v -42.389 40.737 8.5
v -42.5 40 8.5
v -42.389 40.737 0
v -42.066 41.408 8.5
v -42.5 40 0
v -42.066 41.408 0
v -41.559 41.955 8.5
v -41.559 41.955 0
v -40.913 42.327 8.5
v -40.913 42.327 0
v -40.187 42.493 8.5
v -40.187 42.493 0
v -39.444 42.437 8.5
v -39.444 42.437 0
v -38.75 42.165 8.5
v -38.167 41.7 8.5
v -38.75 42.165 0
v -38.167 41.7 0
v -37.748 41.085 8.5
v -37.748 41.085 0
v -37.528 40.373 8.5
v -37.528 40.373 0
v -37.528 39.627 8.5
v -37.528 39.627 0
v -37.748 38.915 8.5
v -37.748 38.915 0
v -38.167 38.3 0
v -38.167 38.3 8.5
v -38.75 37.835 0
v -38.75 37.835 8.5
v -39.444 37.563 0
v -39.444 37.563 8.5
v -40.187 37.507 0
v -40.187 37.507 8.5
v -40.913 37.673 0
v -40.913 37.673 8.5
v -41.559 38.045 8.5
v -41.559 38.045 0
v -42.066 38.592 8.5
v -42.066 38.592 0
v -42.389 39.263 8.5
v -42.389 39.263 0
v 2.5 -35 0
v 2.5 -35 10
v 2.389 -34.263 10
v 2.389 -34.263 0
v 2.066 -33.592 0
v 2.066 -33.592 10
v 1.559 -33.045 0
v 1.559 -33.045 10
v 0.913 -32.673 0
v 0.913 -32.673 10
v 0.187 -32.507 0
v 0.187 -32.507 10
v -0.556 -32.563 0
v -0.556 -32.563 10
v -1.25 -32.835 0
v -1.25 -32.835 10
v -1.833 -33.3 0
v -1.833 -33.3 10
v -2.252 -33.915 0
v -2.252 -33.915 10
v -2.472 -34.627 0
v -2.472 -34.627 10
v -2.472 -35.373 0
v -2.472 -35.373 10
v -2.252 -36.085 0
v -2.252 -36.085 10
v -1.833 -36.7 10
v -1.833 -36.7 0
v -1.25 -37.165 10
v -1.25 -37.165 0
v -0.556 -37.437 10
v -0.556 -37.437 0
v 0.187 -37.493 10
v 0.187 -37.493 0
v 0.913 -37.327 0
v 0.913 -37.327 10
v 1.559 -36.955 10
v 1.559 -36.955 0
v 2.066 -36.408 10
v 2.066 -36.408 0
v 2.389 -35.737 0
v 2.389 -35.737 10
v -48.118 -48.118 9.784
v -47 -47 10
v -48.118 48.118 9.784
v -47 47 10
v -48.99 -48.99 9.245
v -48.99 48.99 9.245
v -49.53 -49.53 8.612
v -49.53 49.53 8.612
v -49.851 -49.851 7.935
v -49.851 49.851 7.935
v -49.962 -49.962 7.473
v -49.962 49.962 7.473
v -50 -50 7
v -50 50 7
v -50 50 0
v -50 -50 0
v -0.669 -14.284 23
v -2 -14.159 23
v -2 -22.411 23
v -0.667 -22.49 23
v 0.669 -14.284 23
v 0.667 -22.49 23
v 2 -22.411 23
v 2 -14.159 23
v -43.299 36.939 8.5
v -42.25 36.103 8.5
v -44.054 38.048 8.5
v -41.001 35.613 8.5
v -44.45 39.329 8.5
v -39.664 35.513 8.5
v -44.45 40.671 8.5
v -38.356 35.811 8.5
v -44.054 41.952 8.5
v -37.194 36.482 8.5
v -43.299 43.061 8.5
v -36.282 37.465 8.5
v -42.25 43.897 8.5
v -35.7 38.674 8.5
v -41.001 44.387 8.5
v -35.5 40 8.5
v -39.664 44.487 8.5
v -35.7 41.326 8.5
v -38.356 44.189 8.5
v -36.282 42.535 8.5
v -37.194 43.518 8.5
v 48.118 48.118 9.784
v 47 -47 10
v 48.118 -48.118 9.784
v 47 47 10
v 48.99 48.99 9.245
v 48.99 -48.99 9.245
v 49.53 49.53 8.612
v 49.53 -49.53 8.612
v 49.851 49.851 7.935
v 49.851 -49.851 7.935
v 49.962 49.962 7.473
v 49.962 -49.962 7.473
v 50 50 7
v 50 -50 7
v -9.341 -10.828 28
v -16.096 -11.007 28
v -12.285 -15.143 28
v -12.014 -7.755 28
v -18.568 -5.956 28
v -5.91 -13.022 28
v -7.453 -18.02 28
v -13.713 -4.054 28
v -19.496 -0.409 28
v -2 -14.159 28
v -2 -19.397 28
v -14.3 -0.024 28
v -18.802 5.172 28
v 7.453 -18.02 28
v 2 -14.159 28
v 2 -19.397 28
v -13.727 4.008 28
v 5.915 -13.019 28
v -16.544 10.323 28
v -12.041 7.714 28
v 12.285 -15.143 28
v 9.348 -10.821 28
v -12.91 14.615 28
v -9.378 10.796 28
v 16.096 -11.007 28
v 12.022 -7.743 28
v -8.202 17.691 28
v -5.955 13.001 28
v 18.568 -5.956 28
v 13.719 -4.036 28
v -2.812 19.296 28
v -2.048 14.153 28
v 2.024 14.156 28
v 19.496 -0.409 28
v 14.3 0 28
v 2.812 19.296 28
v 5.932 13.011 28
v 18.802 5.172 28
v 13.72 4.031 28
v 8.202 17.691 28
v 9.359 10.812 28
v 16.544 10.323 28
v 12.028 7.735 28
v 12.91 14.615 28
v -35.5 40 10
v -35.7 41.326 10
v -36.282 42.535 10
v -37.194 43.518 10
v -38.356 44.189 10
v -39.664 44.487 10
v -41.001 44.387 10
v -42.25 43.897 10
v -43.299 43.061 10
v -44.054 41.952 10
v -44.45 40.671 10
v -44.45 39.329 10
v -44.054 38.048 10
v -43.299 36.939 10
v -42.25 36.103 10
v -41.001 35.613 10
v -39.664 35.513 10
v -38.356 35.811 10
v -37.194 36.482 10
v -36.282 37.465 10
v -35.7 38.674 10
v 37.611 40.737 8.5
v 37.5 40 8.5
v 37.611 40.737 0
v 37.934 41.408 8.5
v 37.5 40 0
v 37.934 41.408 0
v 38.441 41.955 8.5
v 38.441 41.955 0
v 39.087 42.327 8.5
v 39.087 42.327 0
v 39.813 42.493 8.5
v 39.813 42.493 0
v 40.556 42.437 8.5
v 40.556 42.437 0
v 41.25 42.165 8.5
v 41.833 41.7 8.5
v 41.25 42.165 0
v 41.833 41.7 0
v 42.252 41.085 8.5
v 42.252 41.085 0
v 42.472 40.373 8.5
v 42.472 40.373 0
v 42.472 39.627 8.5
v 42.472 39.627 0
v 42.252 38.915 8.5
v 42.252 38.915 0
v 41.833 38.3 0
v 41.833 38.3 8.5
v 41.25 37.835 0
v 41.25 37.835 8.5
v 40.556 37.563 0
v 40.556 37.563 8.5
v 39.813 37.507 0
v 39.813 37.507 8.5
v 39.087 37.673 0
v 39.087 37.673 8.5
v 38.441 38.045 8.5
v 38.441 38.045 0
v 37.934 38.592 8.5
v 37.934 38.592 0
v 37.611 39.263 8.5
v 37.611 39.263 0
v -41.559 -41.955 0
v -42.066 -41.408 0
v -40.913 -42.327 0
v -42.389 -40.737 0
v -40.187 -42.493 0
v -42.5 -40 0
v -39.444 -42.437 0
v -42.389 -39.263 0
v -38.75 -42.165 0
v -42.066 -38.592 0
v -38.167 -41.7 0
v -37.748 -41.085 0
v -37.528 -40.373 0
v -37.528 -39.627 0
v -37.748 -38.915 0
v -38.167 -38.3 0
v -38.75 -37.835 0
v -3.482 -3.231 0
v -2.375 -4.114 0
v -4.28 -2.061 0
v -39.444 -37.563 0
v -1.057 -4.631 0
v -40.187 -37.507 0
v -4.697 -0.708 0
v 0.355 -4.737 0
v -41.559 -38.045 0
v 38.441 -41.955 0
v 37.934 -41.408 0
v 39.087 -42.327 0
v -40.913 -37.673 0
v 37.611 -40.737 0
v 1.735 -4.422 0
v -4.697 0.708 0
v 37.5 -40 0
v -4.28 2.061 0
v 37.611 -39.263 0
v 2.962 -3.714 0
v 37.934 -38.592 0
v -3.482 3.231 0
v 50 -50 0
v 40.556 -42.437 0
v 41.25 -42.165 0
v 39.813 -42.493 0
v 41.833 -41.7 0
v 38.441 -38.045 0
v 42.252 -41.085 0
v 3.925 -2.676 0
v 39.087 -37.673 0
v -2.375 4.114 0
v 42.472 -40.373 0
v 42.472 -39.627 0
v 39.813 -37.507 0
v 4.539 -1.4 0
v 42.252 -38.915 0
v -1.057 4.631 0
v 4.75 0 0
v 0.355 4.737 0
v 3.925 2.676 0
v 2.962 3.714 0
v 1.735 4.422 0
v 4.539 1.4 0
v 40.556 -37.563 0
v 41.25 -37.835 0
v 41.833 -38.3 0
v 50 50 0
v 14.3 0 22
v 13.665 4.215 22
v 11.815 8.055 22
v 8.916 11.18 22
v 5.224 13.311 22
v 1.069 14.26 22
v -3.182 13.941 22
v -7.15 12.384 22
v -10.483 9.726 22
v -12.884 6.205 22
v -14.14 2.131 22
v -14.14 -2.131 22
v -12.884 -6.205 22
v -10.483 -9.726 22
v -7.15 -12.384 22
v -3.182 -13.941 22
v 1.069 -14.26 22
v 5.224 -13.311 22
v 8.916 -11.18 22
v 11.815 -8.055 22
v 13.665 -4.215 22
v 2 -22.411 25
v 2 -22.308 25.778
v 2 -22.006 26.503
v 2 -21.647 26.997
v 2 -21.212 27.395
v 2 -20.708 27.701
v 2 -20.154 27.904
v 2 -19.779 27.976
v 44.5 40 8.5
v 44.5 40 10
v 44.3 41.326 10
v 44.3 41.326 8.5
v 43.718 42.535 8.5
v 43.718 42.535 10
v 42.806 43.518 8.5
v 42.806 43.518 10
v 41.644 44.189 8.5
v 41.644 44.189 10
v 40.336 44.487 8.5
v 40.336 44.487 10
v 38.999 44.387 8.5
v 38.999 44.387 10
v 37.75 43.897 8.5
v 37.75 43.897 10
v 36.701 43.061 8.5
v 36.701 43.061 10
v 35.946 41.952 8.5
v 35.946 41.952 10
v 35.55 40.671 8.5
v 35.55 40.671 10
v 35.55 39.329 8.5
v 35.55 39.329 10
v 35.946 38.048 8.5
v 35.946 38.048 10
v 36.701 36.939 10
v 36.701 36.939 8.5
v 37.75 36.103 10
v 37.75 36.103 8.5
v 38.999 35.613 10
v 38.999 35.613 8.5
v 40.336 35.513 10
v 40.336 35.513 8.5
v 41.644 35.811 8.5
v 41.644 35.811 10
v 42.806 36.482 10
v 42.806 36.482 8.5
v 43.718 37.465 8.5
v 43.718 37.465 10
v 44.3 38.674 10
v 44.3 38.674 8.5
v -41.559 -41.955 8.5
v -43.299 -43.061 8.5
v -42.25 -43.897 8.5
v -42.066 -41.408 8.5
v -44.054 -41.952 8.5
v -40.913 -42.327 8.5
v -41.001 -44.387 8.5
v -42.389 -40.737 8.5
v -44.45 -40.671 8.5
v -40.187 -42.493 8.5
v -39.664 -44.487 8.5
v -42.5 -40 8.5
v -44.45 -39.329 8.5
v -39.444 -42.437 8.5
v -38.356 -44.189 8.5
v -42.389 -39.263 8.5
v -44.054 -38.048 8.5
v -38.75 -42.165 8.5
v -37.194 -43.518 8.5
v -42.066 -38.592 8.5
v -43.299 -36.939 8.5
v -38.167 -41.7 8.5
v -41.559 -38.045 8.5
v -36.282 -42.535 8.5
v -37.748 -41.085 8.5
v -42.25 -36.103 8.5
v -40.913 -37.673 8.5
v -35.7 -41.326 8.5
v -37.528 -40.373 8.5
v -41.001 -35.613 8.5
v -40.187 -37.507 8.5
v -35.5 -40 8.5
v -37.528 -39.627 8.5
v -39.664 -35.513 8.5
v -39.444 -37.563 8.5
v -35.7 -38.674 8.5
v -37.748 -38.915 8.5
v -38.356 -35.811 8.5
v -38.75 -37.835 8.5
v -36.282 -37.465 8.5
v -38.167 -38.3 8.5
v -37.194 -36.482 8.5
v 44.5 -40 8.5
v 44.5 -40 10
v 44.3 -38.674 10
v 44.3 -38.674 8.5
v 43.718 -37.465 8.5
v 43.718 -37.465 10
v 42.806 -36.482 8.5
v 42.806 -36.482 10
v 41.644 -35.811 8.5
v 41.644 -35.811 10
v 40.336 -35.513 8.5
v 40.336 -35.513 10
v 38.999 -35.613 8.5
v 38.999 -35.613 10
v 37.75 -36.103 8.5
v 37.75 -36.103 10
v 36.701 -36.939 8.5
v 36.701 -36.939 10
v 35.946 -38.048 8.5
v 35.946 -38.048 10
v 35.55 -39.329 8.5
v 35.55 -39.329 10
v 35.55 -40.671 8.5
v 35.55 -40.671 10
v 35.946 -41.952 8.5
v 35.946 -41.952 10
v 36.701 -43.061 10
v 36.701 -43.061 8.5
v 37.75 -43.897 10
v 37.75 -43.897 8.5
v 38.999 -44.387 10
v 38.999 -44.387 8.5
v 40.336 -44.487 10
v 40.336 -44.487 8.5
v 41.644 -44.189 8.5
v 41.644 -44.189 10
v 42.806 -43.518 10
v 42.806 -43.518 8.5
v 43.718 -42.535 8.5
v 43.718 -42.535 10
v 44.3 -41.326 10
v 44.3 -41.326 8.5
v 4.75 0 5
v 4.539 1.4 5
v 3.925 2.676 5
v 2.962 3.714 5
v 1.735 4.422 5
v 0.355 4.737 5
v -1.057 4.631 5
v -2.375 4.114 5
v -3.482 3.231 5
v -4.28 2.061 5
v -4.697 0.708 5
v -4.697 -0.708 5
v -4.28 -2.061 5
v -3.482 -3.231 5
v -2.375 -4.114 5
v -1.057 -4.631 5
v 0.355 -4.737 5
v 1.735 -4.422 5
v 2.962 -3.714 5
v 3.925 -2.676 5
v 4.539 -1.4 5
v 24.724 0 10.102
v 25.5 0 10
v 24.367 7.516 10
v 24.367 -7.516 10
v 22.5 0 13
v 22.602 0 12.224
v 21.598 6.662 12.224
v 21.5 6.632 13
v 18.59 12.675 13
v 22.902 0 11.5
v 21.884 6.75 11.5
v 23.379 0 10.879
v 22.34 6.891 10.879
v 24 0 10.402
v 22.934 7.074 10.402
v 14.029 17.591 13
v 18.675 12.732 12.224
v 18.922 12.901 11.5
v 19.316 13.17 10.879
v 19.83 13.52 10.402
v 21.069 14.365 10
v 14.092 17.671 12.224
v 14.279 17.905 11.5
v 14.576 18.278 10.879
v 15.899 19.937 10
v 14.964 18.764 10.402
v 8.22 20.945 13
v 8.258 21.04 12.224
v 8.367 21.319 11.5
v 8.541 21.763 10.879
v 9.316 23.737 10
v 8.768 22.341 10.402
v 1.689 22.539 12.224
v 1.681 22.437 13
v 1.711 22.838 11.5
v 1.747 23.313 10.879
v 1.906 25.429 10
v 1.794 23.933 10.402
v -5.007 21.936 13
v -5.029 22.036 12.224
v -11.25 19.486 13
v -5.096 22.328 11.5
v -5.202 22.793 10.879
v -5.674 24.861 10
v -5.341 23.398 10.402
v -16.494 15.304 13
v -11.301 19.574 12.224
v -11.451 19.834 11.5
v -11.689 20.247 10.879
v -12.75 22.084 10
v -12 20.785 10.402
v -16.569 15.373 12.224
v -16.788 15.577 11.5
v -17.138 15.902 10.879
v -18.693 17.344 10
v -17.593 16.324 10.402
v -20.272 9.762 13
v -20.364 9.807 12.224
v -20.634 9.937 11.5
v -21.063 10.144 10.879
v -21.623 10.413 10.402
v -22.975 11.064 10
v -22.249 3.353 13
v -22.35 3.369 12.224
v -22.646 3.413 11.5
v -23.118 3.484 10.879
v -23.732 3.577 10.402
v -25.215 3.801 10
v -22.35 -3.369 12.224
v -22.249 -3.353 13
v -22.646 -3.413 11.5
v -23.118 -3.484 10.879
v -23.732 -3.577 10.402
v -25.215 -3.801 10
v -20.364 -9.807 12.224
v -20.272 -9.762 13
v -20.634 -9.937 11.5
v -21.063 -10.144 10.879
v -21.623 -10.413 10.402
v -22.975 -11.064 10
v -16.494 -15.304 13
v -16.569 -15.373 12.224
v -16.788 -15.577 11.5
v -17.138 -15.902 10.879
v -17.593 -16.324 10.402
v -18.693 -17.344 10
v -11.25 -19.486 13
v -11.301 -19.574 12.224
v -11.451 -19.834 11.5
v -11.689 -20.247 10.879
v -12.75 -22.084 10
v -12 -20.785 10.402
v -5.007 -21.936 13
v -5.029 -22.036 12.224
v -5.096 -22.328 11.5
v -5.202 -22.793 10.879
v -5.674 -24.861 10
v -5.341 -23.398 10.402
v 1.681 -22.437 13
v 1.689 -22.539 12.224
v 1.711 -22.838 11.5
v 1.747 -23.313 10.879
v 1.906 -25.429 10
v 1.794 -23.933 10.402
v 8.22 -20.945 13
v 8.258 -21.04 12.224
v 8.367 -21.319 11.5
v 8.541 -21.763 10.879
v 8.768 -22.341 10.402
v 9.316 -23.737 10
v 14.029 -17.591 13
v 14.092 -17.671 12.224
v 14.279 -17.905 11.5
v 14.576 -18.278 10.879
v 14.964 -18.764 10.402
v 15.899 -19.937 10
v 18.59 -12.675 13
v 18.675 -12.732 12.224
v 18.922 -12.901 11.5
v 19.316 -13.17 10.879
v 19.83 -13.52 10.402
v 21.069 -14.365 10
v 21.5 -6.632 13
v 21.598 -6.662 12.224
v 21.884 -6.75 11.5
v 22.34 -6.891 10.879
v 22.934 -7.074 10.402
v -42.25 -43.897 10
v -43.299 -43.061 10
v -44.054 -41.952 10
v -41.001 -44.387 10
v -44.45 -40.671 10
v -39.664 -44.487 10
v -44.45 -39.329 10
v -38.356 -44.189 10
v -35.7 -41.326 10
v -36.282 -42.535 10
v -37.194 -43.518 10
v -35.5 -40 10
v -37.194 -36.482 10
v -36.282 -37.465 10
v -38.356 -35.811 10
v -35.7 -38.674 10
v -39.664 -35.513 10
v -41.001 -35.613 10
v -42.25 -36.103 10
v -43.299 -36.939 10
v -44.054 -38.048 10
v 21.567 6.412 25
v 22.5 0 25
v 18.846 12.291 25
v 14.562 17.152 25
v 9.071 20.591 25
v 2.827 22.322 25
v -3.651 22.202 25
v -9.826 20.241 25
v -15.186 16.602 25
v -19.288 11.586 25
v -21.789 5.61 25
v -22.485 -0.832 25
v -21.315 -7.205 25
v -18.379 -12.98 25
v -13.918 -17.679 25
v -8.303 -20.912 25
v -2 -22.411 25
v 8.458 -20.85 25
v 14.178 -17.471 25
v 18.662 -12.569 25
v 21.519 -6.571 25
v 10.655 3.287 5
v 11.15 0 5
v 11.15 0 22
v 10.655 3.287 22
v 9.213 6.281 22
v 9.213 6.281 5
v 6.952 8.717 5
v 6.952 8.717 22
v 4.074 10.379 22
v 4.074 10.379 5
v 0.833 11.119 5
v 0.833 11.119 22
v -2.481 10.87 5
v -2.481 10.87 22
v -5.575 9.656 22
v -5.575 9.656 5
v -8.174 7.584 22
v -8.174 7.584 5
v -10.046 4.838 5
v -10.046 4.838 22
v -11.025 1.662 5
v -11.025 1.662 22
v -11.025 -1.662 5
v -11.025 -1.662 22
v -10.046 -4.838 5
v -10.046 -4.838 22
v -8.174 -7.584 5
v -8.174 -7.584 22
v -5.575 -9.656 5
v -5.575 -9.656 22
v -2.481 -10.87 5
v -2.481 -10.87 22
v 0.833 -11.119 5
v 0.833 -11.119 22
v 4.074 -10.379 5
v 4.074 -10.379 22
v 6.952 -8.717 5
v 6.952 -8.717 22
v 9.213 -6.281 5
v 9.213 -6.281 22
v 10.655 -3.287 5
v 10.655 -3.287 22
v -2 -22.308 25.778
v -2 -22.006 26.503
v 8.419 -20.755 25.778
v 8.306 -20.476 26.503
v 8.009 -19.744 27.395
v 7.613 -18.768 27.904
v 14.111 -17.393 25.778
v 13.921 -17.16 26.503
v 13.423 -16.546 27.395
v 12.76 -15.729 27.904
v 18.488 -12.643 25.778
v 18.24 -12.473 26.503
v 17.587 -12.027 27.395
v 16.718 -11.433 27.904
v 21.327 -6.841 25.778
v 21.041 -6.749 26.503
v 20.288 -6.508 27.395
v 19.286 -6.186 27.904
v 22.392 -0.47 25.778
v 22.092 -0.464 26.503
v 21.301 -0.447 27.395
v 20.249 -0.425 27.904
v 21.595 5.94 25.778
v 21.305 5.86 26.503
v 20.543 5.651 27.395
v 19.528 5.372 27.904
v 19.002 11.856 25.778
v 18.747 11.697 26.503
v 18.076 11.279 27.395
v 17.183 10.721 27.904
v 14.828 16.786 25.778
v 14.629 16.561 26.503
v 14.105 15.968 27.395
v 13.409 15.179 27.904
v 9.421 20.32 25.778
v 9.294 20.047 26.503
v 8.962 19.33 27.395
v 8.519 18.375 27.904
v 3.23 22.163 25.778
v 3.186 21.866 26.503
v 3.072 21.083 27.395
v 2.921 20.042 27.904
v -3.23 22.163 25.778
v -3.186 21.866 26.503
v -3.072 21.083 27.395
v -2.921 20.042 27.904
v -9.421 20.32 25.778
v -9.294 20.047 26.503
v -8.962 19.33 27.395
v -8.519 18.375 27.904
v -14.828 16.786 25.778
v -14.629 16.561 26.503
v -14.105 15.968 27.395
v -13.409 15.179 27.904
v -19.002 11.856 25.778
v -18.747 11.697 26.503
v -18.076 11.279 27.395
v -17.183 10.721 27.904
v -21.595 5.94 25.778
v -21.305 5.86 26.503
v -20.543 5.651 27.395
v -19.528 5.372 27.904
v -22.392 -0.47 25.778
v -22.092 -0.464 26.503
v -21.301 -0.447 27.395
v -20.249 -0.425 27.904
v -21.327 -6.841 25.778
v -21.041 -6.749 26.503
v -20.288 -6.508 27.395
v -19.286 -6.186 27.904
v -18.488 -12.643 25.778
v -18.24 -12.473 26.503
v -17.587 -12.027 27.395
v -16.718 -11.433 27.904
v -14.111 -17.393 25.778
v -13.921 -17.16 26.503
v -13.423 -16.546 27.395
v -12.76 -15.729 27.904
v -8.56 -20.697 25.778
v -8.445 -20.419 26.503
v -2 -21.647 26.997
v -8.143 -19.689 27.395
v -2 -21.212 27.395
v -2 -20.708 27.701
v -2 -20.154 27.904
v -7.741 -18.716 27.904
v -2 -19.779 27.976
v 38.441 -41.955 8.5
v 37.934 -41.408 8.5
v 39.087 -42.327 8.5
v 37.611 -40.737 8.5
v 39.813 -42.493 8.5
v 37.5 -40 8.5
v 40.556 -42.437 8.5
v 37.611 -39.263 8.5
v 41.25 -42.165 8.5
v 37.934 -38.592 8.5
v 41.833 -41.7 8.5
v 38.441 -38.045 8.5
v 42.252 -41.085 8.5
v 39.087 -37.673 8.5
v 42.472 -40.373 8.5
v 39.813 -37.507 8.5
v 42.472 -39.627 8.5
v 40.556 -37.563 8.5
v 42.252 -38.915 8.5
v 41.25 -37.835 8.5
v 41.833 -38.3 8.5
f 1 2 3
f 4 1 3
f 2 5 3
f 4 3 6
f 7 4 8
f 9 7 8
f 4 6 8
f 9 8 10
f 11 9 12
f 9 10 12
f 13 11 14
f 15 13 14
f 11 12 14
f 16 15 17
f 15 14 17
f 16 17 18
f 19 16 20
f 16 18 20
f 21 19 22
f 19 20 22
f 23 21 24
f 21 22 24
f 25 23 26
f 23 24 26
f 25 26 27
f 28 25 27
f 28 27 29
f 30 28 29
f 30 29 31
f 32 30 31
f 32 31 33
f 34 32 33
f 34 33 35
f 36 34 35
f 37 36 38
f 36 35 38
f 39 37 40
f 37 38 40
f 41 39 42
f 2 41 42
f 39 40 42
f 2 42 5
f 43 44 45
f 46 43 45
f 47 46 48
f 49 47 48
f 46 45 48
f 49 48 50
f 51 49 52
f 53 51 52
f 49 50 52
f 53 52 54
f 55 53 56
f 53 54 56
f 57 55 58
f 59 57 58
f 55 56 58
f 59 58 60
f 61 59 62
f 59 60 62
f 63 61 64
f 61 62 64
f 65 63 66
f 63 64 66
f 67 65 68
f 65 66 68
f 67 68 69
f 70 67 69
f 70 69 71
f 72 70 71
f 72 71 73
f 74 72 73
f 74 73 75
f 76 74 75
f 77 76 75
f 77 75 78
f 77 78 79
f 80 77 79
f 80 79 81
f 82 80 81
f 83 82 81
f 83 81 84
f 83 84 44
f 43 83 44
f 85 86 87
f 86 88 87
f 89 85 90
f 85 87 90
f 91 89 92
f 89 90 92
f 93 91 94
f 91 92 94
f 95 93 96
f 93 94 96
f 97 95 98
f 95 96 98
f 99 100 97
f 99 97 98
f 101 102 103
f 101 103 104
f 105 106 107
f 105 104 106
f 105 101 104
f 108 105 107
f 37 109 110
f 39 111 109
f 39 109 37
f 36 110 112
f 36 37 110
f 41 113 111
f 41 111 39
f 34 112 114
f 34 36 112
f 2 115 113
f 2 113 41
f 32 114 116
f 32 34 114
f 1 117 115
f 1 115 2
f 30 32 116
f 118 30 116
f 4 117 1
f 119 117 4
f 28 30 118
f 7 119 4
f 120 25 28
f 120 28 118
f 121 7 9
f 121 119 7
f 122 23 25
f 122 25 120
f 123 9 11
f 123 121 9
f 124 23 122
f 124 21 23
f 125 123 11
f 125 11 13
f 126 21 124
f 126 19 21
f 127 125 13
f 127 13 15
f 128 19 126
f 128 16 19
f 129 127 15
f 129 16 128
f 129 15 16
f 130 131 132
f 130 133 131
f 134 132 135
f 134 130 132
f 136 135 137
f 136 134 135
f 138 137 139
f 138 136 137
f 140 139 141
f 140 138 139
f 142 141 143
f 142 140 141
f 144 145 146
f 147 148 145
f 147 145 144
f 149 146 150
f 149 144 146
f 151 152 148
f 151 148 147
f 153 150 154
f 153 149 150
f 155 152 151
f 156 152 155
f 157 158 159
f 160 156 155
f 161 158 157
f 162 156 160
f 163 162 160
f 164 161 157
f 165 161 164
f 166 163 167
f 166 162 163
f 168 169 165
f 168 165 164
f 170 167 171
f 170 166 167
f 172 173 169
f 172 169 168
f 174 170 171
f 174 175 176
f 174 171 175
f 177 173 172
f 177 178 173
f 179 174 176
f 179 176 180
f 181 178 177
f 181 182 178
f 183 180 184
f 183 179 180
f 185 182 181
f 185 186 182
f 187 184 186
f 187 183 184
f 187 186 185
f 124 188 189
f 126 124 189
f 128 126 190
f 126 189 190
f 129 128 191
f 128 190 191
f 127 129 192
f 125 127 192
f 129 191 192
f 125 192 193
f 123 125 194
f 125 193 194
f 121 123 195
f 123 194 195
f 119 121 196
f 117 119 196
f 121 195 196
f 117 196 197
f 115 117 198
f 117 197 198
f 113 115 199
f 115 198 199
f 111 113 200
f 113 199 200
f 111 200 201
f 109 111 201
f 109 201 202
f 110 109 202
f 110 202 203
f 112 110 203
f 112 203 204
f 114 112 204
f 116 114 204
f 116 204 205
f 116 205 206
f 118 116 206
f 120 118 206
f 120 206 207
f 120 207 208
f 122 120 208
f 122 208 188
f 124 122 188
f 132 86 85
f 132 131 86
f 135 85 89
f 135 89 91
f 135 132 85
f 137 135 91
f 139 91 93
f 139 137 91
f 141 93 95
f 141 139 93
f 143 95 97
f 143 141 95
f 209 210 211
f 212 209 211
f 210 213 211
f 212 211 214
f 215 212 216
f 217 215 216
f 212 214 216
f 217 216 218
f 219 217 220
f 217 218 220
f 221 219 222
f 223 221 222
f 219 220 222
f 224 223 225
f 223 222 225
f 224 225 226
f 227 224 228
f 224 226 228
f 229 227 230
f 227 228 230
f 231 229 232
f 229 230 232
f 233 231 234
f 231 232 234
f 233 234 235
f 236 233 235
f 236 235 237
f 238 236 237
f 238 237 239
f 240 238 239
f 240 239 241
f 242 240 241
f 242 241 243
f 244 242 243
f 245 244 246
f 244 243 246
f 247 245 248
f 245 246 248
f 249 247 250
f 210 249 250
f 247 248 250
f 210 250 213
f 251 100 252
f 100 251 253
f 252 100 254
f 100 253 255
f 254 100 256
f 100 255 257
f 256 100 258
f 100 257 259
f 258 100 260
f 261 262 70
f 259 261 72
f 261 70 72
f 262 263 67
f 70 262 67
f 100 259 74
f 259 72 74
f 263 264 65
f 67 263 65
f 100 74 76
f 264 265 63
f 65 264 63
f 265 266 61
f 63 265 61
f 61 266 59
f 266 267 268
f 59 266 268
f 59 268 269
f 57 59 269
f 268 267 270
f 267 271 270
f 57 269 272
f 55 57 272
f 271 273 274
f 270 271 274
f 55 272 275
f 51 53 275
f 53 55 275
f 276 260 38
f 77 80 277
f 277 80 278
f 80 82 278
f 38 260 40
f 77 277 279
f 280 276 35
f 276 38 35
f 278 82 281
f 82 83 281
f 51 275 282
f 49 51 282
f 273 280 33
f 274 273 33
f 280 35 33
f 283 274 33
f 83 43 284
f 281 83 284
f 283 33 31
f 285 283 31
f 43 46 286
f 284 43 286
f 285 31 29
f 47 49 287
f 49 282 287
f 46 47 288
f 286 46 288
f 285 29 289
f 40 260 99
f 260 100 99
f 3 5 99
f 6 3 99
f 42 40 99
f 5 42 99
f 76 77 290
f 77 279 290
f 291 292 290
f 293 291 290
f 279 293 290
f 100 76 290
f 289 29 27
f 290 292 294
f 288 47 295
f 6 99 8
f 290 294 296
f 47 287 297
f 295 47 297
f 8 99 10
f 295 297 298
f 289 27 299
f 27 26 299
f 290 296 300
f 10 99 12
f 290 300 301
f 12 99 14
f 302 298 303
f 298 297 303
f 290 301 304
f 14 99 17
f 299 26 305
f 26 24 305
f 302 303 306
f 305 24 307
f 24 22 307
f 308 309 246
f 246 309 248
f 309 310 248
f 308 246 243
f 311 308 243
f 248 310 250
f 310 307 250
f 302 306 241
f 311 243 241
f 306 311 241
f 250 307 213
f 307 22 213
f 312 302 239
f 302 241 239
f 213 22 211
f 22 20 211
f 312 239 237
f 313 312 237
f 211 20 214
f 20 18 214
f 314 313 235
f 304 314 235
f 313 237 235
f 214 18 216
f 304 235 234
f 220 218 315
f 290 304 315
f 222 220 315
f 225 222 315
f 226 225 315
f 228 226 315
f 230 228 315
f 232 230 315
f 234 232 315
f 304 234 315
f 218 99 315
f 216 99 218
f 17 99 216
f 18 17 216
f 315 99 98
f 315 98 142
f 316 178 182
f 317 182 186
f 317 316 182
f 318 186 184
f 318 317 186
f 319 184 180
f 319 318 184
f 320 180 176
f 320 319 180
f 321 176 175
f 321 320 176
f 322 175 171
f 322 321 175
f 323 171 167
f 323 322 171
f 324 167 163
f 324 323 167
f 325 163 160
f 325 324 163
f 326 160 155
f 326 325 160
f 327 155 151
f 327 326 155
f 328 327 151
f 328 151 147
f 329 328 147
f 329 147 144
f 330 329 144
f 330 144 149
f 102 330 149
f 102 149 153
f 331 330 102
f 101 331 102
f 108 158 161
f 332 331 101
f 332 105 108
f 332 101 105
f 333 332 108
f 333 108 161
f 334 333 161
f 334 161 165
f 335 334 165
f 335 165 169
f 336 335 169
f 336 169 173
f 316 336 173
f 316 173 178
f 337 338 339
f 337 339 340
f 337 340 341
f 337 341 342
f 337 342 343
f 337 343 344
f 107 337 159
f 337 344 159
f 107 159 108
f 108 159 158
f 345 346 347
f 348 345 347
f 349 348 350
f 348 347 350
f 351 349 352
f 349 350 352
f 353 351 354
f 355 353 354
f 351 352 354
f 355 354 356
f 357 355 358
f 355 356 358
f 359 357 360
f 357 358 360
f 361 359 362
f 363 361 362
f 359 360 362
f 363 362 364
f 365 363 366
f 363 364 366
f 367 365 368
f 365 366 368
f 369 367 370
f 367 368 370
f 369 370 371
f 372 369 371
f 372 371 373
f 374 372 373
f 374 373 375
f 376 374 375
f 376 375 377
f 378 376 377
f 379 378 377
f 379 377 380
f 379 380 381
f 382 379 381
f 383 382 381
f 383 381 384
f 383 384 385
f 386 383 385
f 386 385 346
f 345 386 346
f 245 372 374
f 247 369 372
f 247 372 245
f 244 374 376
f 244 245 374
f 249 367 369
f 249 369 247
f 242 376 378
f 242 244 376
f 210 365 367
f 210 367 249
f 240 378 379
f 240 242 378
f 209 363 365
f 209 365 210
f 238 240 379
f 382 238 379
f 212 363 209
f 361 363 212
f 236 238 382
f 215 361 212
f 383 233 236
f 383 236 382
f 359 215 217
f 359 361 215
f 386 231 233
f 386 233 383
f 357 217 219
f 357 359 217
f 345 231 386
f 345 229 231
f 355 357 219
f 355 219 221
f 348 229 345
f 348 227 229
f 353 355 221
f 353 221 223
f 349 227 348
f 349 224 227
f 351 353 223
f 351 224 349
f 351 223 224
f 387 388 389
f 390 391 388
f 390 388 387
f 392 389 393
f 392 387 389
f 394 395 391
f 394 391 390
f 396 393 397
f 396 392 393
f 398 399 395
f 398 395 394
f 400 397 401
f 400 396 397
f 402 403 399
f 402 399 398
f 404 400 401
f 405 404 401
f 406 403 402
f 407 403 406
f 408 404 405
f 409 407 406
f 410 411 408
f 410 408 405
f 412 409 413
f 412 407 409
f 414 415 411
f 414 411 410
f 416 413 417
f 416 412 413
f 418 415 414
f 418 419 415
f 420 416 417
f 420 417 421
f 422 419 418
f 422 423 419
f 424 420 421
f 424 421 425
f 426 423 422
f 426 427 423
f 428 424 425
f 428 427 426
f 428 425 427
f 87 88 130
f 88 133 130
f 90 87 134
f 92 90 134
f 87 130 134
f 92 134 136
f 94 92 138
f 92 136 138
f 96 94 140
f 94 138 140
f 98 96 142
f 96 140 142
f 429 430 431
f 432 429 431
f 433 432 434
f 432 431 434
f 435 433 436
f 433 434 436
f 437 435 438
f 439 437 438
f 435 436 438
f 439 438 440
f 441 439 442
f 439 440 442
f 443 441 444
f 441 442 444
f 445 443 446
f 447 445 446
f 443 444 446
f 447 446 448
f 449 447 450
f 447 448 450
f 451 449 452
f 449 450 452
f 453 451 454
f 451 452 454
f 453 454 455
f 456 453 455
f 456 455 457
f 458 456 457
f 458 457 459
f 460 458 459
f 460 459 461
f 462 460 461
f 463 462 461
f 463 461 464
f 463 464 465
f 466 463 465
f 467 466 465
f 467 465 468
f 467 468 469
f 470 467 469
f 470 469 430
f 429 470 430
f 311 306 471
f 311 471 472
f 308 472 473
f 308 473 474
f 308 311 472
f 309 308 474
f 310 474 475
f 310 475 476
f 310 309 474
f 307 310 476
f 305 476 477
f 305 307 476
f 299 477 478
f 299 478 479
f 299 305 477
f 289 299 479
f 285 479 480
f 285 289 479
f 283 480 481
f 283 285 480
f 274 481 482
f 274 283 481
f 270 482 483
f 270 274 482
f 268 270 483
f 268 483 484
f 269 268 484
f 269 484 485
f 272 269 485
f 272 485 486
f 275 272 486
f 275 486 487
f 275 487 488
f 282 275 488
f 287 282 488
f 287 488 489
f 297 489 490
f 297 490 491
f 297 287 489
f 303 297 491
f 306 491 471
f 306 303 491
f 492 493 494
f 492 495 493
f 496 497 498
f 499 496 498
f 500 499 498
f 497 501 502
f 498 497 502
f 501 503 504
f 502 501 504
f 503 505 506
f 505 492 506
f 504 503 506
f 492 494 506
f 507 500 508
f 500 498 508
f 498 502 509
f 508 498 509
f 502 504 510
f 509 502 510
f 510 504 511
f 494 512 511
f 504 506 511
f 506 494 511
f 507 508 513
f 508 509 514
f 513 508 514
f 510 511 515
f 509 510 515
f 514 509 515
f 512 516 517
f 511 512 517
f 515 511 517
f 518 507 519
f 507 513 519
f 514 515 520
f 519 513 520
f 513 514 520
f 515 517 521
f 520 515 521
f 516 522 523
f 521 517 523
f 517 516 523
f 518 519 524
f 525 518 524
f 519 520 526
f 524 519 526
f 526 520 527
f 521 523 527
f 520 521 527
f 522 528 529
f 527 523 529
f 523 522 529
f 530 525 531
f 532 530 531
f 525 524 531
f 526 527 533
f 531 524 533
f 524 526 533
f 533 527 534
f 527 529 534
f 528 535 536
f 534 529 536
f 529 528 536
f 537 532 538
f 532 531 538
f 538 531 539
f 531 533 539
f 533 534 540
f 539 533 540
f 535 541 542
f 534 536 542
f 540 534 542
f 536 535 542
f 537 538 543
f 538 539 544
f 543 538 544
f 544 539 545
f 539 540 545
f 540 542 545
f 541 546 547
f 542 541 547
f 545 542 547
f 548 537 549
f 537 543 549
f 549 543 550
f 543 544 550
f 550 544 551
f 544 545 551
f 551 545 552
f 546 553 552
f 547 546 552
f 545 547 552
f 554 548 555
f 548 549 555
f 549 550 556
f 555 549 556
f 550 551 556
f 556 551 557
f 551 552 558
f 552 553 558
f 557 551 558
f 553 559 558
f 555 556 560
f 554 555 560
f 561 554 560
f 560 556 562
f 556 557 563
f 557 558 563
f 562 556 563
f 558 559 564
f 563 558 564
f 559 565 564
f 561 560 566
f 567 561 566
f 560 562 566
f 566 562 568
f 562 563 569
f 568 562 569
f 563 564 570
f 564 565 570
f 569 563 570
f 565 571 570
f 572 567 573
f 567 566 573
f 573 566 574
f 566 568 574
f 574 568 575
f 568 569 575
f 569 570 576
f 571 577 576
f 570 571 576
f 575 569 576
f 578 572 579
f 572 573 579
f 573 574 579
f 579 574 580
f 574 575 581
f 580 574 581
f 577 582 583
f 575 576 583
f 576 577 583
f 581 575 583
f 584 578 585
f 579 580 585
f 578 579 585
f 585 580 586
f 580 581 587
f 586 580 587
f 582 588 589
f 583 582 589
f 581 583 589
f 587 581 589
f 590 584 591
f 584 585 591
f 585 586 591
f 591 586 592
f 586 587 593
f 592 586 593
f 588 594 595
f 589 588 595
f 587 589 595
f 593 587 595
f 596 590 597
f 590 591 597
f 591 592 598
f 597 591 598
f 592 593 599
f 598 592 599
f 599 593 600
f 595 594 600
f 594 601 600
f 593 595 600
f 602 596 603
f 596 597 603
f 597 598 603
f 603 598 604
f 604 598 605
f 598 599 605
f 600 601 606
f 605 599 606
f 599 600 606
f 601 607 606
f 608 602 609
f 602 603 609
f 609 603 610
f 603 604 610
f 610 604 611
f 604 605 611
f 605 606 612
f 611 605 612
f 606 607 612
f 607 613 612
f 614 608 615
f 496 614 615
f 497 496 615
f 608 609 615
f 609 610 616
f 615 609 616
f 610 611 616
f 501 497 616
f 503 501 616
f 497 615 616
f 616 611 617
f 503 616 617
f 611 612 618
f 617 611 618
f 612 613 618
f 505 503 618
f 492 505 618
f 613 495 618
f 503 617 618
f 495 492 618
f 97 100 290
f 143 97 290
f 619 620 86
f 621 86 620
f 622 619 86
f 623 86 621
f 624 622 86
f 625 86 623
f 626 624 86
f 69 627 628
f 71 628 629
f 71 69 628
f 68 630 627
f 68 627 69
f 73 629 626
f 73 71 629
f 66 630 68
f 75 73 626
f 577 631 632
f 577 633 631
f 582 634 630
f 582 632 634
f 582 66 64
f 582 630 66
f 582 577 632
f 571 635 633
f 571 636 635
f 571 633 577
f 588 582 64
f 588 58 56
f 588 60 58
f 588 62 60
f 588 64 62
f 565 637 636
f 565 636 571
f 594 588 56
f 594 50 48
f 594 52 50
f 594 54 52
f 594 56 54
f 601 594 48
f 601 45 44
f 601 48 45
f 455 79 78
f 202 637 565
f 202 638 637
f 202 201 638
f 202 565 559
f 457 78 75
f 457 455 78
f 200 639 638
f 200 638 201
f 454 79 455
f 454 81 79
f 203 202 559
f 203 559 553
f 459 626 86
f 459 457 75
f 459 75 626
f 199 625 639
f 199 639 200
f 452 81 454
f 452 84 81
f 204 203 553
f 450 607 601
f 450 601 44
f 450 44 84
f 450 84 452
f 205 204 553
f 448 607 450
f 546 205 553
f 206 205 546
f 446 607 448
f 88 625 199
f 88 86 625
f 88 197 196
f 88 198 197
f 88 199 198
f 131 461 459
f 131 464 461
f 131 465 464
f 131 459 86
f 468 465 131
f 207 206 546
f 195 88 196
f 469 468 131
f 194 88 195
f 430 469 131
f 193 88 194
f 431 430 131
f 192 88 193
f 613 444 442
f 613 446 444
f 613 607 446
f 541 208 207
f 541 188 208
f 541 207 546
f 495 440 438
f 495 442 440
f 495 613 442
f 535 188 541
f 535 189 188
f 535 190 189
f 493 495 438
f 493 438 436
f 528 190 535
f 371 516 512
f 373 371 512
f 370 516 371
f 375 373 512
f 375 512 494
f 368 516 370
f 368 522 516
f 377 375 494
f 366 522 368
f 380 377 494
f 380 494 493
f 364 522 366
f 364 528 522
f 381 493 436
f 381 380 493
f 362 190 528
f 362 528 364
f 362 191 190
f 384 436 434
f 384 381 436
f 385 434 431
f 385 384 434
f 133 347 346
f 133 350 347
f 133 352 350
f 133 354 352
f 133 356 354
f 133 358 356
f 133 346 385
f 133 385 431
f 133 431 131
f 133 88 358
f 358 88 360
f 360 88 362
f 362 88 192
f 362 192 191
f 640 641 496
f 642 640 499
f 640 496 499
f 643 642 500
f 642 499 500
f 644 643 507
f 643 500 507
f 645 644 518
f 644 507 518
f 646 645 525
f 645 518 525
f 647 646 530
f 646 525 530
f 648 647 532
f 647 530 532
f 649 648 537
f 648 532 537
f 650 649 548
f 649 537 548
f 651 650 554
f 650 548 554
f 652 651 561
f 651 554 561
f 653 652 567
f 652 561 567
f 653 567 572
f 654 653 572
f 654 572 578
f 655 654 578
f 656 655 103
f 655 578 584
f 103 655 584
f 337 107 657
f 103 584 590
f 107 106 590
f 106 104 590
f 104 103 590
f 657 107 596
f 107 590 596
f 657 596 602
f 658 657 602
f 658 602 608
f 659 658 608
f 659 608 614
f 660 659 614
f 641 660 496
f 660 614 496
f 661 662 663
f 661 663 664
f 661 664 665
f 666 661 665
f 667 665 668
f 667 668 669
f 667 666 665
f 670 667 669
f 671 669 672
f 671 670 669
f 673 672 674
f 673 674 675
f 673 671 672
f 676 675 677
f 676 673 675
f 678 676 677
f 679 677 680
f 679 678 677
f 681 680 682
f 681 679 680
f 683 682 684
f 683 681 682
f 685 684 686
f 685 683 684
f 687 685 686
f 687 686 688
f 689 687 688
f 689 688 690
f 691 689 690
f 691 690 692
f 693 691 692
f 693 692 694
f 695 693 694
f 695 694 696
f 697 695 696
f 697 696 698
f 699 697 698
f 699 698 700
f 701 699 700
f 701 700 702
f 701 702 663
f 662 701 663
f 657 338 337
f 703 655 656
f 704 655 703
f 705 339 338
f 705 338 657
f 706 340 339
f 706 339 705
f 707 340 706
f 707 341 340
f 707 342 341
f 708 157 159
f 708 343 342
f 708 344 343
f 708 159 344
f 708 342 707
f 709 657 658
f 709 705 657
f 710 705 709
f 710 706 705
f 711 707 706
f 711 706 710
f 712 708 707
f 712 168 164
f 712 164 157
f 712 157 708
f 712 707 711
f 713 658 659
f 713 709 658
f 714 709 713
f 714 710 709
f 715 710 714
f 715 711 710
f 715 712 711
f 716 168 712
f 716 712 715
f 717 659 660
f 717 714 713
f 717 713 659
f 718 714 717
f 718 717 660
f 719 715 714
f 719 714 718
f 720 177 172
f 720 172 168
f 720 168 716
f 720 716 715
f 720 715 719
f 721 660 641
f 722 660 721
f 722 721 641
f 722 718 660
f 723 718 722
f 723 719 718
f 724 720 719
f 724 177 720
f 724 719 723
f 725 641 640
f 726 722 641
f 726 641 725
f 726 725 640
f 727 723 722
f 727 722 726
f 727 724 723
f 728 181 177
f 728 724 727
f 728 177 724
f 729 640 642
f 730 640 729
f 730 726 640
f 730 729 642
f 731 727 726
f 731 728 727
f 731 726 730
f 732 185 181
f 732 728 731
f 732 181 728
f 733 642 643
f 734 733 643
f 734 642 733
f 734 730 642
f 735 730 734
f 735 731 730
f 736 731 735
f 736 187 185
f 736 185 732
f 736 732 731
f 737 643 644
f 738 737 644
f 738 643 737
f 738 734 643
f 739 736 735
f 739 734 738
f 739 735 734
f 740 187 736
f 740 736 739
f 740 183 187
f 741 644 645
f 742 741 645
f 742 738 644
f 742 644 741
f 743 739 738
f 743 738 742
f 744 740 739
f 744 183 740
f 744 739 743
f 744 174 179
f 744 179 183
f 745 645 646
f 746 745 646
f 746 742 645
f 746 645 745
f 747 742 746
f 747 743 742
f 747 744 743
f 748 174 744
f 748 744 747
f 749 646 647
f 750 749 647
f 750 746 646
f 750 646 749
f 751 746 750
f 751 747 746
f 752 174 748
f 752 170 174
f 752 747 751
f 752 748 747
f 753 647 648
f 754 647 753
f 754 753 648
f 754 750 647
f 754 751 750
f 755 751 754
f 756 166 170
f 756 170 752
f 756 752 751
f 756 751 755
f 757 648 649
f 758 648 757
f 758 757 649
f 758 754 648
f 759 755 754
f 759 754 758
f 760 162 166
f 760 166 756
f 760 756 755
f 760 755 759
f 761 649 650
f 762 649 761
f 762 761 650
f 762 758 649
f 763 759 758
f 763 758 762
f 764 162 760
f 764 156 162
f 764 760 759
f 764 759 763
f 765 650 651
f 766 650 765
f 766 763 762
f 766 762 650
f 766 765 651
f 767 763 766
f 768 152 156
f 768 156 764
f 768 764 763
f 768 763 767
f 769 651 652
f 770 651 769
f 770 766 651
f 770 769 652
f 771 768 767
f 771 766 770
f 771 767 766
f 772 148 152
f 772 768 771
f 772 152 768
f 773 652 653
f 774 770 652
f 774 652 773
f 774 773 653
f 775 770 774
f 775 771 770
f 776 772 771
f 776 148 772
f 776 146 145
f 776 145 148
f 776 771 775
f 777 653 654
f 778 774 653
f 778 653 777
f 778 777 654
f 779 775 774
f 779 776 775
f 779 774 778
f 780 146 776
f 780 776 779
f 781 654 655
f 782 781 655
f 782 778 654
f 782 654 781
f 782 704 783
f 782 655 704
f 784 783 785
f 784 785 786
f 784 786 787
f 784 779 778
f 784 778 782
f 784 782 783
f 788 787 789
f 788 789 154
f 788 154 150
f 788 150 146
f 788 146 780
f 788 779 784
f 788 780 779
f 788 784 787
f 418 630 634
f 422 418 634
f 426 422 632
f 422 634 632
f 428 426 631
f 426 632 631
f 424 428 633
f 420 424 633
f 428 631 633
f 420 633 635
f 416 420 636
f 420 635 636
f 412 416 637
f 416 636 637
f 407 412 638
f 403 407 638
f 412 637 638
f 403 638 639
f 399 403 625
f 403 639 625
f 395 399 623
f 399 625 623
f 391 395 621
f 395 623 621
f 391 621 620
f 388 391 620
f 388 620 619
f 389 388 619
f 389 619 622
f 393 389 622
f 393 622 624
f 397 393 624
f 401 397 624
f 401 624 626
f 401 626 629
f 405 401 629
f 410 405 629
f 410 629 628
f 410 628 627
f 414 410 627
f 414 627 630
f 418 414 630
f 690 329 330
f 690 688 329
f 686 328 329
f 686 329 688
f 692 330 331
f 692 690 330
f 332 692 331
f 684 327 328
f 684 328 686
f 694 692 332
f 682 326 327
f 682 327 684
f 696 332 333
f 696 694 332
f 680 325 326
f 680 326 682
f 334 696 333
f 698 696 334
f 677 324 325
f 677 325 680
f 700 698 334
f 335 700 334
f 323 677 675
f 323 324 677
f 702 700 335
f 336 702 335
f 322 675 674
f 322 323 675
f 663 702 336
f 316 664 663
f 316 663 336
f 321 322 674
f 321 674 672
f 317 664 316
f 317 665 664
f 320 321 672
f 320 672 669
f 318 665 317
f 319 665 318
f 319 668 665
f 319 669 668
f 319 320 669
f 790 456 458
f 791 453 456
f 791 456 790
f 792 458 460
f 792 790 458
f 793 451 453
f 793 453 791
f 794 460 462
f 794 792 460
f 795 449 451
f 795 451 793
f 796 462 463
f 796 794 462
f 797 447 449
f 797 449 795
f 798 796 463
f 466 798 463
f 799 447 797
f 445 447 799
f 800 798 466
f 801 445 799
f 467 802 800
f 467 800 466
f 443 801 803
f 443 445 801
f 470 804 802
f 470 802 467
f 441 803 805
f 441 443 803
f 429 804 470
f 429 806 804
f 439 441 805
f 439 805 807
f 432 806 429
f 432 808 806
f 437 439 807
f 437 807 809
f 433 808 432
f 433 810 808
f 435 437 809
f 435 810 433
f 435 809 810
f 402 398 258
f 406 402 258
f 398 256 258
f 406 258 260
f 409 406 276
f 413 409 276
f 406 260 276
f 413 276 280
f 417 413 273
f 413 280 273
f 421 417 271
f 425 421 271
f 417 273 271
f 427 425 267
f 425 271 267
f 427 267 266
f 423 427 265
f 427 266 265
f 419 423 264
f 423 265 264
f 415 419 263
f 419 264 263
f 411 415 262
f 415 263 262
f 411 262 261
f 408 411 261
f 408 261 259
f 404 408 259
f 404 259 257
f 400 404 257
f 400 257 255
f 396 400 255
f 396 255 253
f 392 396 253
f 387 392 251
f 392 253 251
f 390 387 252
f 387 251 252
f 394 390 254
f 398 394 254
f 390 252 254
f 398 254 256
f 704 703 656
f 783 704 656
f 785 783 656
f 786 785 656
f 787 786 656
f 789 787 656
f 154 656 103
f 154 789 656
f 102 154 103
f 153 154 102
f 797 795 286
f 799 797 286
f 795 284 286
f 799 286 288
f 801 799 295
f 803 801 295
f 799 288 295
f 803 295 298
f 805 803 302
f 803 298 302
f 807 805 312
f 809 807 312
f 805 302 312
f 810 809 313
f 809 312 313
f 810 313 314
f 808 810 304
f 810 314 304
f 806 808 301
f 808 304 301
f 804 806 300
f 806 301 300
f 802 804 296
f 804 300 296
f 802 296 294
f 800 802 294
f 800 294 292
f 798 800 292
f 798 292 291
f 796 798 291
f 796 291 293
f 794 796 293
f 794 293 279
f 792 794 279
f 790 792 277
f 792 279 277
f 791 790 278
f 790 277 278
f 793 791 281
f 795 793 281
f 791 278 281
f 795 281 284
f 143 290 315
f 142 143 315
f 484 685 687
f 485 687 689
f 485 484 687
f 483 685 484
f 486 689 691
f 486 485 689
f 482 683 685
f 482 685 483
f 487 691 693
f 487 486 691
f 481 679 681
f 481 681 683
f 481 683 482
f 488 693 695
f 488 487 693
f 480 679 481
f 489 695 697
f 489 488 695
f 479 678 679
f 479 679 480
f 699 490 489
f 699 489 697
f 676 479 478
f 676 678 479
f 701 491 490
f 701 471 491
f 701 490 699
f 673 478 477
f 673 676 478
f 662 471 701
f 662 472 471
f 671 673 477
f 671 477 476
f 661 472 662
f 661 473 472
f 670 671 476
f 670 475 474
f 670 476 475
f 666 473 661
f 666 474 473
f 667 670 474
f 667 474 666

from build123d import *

# Parameters (mm, degrees)
F0_W           = 100
F0_H           = 100
F0_R           = 22.5
F1_DEPTH       = 10
F0_R_2         = 11.15
F0_R_3         = 4.75
F2_DEPTH       = 5
F0_R_4         = 14.3
F3_DEPTH       = 22
F4_DEPTH       = 28
F6_D           = 5
F6_CBORE_D     = 9
F6_CBORE_DEPTH = 1.5
F7_R           = 3
F8_W           = 4
F8_H           = 30
F9_DEPTH       = 5
F5_R           = 2.5
F10_DEPTH      = 10.001


with BuildPart() as f1:
    # F0 (on Top) → F1 (new body)
    with BuildSketch(Plane.XY):
        Rectangle(F0_W, F0_H)
        Circle(F0_R, mode=Mode.SUBTRACT)
    extrude(amount=F1_DEPTH)



with BuildPart() as f2:
    # F0 (on Top) → F2 (new body)
    with BuildSketch(Plane.XY):
        Circle(F0_R_2)
        Circle(F0_R_3, mode=Mode.SUBTRACT)
    extrude(amount=F2_DEPTH)

    # F0 (on Top) → F3 (join)
    with BuildSketch(Plane.XY):
        Circle(F0_R_4)
        Circle(F0_R_2, mode=Mode.SUBTRACT)
    extrude(amount=F3_DEPTH)


with BuildPart() as f1_1:
    add(f1.part)

    add(f2.part)  # F4 merges F2
    # F0 (on Top) → F4 (join)
    with BuildSketch(Plane.XY):
        Circle(F0_R)
        Circle(F0_R_4, mode=Mode.SUBTRACT)
    extrude(amount=F4_DEPTH)

    # F6 (through all)
    with Locations(Plane.XY.offset(10)):
        with Locations((-40, 40), (40, 40), (40, -40), (-40, -40)):
            CounterBoreHole(F6_D / 2, F6_CBORE_D / 2, F6_CBORE_DEPTH)

    # F7
    f7_edges = [f1_1.edges().sort_by_distance(p)[0] for p in [
        (-50, 0, 10),
        (0, 50, 10),
        (50, 0, 10),
        (0, -50, 10),
        (-22.5, 0, 10),
        (-22.5, 0, 28),
    ]]
    fillet(f7_edges, radius=F7_R)

    # F8 (on face) → F9 (cut)
    with BuildSketch(Plane.XY.offset(28)):
        with Locations((0, -15)):
            Rectangle(F8_W, F8_H)
    extrude(amount=-F9_DEPTH, mode=Mode.SUBTRACT)

    # F5 (on face) → F10 (cut, through all)
    with BuildSketch(Plane.XY.offset(10)):
        with Locations((0, -35)):
            Circle(F5_R)
    extrude(amount=-F10_DEPTH, mode=Mode.SUBTRACT)


solid = f1_1.part
